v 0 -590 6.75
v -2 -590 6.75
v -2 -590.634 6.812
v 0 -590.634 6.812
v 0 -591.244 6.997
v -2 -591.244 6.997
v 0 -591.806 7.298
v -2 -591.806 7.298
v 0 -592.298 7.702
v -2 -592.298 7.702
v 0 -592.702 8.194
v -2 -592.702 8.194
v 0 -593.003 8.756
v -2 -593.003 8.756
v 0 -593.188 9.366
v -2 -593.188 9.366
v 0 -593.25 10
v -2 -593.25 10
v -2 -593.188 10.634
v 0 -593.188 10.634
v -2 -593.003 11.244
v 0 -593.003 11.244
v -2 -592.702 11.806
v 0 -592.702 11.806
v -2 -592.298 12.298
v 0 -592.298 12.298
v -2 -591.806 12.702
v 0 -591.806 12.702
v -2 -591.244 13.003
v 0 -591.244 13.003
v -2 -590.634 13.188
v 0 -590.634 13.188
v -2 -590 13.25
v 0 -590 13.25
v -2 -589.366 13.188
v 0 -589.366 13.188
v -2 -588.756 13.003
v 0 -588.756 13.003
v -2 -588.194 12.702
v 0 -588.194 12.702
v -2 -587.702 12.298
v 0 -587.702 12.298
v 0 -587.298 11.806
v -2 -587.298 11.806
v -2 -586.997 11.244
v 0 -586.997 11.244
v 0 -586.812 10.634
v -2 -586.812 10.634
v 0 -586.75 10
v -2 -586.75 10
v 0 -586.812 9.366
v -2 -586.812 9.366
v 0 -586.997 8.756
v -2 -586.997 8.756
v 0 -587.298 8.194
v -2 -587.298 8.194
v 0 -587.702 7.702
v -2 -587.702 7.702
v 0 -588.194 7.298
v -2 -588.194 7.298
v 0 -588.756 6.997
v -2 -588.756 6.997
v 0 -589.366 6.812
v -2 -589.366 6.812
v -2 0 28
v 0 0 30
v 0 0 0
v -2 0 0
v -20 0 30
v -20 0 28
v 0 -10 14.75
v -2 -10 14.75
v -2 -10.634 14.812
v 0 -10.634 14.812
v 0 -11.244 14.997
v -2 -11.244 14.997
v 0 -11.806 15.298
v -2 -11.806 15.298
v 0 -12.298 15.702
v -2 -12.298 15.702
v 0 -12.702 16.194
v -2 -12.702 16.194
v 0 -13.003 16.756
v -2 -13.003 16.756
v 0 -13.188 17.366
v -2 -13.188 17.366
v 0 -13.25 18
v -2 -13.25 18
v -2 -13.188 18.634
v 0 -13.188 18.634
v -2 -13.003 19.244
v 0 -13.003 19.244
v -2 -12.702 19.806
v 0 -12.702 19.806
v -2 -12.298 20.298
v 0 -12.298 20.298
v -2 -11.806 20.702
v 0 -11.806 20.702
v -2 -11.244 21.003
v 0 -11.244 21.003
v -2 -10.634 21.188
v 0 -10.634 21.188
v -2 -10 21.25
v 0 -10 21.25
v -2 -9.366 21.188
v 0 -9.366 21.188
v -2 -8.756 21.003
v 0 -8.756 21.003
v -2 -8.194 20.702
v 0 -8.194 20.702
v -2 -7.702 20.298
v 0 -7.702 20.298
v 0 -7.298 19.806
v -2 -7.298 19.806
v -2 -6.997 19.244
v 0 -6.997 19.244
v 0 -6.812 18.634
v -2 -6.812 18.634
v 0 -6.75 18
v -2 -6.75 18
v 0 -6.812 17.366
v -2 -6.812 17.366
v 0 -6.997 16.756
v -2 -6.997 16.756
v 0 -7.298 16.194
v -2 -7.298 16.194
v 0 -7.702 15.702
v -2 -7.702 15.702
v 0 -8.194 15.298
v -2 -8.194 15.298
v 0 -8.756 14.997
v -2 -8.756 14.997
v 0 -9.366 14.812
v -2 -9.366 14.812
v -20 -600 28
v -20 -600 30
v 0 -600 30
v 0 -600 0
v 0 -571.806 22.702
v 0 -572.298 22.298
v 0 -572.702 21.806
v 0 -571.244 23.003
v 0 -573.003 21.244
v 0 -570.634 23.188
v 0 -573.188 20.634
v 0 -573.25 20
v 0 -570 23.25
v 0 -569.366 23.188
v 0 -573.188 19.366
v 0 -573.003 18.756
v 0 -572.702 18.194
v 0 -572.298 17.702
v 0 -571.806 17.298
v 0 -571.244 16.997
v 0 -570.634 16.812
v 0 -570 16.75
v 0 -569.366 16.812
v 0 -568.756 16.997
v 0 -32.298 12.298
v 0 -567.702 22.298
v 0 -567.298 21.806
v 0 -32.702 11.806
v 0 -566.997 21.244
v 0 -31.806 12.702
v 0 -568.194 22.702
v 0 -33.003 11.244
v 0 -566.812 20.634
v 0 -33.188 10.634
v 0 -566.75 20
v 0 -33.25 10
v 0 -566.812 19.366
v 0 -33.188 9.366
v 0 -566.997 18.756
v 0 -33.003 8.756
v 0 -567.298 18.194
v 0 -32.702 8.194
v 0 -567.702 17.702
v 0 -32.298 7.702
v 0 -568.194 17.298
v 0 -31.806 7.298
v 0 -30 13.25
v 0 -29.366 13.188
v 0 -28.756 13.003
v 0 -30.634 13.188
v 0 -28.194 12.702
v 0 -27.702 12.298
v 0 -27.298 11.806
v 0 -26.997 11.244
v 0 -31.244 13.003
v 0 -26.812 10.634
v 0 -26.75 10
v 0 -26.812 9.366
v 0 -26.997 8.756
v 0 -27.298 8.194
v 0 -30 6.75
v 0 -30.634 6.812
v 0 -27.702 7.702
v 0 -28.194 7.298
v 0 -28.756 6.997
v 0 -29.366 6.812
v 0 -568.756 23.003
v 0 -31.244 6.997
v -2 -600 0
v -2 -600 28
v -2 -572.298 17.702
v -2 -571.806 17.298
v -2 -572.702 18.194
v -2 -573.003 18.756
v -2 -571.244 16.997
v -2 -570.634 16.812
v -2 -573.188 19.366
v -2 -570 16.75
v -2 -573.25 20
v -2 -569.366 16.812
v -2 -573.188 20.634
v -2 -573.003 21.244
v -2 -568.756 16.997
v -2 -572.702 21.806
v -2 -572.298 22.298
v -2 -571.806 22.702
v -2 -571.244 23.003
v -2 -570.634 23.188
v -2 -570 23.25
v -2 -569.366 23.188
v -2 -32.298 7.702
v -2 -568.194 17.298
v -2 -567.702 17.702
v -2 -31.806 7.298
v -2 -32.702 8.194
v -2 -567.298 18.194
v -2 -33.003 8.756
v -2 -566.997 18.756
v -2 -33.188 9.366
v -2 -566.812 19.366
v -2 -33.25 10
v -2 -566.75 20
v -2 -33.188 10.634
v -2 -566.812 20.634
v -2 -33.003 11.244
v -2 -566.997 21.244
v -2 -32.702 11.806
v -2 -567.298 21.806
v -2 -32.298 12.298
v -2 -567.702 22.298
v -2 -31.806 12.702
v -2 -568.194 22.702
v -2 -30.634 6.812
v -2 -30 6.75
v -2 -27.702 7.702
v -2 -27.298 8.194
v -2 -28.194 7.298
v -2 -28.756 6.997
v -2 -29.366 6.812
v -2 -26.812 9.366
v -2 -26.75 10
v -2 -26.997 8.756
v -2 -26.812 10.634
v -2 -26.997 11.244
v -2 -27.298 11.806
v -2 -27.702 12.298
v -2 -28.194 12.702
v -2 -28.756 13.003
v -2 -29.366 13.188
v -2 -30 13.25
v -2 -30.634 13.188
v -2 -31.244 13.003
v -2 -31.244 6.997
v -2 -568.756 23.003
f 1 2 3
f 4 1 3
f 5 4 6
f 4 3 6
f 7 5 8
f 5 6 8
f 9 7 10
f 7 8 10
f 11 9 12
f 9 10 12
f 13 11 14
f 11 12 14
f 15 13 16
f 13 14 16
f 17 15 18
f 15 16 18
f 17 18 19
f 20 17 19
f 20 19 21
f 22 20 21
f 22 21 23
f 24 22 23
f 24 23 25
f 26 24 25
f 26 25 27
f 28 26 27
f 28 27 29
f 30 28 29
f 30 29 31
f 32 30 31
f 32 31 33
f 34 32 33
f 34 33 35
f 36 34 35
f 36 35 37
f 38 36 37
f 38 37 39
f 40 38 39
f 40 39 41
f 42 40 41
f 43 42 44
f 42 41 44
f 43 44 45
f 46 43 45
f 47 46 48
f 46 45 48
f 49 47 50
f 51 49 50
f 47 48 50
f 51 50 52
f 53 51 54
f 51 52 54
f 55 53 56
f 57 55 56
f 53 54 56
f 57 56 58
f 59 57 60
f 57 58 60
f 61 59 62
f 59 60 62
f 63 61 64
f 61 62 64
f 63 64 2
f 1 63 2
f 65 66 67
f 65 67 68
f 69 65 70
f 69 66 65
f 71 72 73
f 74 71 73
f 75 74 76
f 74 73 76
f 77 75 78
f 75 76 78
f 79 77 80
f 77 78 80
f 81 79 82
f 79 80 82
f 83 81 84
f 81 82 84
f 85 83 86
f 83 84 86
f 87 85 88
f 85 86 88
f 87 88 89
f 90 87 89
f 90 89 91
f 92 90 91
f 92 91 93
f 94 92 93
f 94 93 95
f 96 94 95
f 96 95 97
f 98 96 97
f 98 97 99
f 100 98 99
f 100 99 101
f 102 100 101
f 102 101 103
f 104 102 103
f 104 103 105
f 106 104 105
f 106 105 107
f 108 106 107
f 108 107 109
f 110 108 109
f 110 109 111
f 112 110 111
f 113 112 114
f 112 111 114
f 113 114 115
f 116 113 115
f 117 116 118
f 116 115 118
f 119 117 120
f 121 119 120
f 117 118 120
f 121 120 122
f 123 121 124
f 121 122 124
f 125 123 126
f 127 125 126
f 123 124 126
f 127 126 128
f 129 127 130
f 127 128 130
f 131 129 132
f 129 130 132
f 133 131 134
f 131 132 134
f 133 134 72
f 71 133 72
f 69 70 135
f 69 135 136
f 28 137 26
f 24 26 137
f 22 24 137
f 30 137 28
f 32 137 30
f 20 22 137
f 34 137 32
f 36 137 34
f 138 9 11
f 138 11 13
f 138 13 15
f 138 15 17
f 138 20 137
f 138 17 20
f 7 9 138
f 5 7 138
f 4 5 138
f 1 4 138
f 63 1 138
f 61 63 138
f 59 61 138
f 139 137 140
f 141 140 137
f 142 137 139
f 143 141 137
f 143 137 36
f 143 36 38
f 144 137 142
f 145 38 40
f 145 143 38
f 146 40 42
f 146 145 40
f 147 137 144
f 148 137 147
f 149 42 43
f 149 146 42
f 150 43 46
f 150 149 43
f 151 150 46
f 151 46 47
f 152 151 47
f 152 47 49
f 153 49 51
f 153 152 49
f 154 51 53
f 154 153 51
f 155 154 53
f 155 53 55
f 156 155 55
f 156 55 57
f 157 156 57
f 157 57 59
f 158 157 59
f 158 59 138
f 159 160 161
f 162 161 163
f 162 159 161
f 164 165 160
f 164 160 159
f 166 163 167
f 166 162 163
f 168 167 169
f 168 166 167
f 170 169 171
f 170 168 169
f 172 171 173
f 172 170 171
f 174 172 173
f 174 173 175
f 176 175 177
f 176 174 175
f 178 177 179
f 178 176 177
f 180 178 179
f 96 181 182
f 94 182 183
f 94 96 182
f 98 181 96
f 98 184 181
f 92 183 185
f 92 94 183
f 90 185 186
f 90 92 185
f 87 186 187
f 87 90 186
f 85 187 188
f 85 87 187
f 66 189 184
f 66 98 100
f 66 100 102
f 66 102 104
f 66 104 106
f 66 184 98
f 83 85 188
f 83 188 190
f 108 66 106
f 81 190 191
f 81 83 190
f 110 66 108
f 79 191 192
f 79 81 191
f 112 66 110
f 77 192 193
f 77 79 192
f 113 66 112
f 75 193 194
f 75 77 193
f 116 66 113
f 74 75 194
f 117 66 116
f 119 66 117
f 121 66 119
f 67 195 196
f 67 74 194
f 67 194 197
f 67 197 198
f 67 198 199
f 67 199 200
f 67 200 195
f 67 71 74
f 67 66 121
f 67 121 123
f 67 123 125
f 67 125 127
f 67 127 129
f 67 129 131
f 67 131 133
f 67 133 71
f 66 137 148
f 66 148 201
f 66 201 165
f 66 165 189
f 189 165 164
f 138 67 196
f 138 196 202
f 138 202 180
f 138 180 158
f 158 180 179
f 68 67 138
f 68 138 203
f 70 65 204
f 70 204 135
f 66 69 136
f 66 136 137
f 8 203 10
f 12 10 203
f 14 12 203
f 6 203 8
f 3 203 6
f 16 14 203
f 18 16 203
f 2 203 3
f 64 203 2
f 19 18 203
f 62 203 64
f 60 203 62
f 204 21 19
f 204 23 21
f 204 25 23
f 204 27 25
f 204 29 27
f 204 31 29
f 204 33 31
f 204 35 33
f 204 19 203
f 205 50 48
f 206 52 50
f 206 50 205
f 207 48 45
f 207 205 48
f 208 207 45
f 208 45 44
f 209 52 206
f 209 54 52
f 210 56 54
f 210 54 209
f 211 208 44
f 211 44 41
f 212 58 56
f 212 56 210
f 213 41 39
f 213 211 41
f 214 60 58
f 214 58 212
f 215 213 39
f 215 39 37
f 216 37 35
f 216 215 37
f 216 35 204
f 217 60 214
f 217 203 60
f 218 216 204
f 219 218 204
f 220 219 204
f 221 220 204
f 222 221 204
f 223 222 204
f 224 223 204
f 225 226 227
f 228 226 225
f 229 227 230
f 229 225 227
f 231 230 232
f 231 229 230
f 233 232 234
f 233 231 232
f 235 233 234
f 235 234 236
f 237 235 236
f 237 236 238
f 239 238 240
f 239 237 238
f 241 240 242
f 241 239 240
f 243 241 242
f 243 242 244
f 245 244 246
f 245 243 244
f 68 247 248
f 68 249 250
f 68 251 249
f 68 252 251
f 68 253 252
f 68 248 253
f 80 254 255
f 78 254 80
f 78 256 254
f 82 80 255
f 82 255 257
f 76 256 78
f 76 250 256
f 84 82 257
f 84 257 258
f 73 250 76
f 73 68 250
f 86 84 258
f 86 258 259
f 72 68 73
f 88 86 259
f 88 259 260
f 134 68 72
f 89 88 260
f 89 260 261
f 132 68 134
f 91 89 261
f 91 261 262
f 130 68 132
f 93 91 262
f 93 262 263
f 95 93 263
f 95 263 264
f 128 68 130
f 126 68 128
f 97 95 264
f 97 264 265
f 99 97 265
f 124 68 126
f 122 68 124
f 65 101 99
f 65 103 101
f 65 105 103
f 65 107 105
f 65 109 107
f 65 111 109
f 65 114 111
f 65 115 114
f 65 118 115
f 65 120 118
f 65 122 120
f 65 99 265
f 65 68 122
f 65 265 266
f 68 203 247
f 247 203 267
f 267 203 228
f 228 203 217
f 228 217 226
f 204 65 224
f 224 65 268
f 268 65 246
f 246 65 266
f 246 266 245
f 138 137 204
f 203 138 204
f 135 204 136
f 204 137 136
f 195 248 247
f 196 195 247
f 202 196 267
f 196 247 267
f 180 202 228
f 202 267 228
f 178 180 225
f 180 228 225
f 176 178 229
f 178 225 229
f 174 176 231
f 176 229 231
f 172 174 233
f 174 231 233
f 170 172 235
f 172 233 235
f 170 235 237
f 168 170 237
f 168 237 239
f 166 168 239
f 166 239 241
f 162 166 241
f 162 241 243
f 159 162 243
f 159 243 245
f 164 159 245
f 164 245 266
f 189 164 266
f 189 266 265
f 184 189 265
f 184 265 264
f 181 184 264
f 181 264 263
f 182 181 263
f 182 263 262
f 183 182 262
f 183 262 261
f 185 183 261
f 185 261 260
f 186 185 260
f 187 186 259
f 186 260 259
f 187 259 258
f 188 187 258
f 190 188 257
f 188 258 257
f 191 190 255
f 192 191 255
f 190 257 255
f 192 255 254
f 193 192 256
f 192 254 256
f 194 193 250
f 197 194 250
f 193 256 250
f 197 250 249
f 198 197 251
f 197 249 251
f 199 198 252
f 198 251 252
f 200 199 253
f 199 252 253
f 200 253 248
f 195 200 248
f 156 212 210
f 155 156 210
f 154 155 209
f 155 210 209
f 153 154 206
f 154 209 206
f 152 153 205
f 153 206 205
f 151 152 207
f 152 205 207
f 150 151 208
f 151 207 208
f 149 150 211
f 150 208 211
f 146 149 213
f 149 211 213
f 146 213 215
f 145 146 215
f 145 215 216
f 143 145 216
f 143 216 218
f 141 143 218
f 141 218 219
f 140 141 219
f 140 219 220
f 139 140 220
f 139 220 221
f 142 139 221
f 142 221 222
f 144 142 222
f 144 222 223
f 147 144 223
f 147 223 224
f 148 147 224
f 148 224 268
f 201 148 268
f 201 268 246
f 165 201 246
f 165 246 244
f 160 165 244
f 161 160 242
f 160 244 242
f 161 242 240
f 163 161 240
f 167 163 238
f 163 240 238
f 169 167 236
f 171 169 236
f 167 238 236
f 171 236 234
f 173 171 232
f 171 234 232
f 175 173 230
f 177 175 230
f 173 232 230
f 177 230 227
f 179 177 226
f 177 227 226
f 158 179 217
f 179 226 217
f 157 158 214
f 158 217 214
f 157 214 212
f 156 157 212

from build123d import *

# Parameters (mm, degrees)
PAD_DEPTH   = 600
SKETCH001_R = 3.25
HOLE_DEPTH  = 25


with BuildPart() as part:
    # Sketch → Pad (new body)
    with BuildSketch(Plane.XZ):
        Polygon((-20, 30), (0, 30), (0, 0), (-2, 0), (-2, 28), (-20, 28), align=None)
    extrude(amount=PAD_DEPTH)

    # Sketch001 (on Face4 of Pad) → Hole (cut)
    with BuildSketch(Plane(origin=(-2, 0, 0), x_dir=(0, 0, -1), z_dir=(-1, 0, 0))):
        with Locations((-18, 10)):
            Circle(SKETCH001_R)
        with Locations((-10, 30)):
            Circle(SKETCH001_R)
        with Locations((-10, 590)):
            Circle(SKETCH001_R)
        with Locations((-20, 570)):
            Circle(SKETCH001_R)
    extrude(amount=-HOLE_DEPTH, mode=Mode.SUBTRACT)


solid = part.part
